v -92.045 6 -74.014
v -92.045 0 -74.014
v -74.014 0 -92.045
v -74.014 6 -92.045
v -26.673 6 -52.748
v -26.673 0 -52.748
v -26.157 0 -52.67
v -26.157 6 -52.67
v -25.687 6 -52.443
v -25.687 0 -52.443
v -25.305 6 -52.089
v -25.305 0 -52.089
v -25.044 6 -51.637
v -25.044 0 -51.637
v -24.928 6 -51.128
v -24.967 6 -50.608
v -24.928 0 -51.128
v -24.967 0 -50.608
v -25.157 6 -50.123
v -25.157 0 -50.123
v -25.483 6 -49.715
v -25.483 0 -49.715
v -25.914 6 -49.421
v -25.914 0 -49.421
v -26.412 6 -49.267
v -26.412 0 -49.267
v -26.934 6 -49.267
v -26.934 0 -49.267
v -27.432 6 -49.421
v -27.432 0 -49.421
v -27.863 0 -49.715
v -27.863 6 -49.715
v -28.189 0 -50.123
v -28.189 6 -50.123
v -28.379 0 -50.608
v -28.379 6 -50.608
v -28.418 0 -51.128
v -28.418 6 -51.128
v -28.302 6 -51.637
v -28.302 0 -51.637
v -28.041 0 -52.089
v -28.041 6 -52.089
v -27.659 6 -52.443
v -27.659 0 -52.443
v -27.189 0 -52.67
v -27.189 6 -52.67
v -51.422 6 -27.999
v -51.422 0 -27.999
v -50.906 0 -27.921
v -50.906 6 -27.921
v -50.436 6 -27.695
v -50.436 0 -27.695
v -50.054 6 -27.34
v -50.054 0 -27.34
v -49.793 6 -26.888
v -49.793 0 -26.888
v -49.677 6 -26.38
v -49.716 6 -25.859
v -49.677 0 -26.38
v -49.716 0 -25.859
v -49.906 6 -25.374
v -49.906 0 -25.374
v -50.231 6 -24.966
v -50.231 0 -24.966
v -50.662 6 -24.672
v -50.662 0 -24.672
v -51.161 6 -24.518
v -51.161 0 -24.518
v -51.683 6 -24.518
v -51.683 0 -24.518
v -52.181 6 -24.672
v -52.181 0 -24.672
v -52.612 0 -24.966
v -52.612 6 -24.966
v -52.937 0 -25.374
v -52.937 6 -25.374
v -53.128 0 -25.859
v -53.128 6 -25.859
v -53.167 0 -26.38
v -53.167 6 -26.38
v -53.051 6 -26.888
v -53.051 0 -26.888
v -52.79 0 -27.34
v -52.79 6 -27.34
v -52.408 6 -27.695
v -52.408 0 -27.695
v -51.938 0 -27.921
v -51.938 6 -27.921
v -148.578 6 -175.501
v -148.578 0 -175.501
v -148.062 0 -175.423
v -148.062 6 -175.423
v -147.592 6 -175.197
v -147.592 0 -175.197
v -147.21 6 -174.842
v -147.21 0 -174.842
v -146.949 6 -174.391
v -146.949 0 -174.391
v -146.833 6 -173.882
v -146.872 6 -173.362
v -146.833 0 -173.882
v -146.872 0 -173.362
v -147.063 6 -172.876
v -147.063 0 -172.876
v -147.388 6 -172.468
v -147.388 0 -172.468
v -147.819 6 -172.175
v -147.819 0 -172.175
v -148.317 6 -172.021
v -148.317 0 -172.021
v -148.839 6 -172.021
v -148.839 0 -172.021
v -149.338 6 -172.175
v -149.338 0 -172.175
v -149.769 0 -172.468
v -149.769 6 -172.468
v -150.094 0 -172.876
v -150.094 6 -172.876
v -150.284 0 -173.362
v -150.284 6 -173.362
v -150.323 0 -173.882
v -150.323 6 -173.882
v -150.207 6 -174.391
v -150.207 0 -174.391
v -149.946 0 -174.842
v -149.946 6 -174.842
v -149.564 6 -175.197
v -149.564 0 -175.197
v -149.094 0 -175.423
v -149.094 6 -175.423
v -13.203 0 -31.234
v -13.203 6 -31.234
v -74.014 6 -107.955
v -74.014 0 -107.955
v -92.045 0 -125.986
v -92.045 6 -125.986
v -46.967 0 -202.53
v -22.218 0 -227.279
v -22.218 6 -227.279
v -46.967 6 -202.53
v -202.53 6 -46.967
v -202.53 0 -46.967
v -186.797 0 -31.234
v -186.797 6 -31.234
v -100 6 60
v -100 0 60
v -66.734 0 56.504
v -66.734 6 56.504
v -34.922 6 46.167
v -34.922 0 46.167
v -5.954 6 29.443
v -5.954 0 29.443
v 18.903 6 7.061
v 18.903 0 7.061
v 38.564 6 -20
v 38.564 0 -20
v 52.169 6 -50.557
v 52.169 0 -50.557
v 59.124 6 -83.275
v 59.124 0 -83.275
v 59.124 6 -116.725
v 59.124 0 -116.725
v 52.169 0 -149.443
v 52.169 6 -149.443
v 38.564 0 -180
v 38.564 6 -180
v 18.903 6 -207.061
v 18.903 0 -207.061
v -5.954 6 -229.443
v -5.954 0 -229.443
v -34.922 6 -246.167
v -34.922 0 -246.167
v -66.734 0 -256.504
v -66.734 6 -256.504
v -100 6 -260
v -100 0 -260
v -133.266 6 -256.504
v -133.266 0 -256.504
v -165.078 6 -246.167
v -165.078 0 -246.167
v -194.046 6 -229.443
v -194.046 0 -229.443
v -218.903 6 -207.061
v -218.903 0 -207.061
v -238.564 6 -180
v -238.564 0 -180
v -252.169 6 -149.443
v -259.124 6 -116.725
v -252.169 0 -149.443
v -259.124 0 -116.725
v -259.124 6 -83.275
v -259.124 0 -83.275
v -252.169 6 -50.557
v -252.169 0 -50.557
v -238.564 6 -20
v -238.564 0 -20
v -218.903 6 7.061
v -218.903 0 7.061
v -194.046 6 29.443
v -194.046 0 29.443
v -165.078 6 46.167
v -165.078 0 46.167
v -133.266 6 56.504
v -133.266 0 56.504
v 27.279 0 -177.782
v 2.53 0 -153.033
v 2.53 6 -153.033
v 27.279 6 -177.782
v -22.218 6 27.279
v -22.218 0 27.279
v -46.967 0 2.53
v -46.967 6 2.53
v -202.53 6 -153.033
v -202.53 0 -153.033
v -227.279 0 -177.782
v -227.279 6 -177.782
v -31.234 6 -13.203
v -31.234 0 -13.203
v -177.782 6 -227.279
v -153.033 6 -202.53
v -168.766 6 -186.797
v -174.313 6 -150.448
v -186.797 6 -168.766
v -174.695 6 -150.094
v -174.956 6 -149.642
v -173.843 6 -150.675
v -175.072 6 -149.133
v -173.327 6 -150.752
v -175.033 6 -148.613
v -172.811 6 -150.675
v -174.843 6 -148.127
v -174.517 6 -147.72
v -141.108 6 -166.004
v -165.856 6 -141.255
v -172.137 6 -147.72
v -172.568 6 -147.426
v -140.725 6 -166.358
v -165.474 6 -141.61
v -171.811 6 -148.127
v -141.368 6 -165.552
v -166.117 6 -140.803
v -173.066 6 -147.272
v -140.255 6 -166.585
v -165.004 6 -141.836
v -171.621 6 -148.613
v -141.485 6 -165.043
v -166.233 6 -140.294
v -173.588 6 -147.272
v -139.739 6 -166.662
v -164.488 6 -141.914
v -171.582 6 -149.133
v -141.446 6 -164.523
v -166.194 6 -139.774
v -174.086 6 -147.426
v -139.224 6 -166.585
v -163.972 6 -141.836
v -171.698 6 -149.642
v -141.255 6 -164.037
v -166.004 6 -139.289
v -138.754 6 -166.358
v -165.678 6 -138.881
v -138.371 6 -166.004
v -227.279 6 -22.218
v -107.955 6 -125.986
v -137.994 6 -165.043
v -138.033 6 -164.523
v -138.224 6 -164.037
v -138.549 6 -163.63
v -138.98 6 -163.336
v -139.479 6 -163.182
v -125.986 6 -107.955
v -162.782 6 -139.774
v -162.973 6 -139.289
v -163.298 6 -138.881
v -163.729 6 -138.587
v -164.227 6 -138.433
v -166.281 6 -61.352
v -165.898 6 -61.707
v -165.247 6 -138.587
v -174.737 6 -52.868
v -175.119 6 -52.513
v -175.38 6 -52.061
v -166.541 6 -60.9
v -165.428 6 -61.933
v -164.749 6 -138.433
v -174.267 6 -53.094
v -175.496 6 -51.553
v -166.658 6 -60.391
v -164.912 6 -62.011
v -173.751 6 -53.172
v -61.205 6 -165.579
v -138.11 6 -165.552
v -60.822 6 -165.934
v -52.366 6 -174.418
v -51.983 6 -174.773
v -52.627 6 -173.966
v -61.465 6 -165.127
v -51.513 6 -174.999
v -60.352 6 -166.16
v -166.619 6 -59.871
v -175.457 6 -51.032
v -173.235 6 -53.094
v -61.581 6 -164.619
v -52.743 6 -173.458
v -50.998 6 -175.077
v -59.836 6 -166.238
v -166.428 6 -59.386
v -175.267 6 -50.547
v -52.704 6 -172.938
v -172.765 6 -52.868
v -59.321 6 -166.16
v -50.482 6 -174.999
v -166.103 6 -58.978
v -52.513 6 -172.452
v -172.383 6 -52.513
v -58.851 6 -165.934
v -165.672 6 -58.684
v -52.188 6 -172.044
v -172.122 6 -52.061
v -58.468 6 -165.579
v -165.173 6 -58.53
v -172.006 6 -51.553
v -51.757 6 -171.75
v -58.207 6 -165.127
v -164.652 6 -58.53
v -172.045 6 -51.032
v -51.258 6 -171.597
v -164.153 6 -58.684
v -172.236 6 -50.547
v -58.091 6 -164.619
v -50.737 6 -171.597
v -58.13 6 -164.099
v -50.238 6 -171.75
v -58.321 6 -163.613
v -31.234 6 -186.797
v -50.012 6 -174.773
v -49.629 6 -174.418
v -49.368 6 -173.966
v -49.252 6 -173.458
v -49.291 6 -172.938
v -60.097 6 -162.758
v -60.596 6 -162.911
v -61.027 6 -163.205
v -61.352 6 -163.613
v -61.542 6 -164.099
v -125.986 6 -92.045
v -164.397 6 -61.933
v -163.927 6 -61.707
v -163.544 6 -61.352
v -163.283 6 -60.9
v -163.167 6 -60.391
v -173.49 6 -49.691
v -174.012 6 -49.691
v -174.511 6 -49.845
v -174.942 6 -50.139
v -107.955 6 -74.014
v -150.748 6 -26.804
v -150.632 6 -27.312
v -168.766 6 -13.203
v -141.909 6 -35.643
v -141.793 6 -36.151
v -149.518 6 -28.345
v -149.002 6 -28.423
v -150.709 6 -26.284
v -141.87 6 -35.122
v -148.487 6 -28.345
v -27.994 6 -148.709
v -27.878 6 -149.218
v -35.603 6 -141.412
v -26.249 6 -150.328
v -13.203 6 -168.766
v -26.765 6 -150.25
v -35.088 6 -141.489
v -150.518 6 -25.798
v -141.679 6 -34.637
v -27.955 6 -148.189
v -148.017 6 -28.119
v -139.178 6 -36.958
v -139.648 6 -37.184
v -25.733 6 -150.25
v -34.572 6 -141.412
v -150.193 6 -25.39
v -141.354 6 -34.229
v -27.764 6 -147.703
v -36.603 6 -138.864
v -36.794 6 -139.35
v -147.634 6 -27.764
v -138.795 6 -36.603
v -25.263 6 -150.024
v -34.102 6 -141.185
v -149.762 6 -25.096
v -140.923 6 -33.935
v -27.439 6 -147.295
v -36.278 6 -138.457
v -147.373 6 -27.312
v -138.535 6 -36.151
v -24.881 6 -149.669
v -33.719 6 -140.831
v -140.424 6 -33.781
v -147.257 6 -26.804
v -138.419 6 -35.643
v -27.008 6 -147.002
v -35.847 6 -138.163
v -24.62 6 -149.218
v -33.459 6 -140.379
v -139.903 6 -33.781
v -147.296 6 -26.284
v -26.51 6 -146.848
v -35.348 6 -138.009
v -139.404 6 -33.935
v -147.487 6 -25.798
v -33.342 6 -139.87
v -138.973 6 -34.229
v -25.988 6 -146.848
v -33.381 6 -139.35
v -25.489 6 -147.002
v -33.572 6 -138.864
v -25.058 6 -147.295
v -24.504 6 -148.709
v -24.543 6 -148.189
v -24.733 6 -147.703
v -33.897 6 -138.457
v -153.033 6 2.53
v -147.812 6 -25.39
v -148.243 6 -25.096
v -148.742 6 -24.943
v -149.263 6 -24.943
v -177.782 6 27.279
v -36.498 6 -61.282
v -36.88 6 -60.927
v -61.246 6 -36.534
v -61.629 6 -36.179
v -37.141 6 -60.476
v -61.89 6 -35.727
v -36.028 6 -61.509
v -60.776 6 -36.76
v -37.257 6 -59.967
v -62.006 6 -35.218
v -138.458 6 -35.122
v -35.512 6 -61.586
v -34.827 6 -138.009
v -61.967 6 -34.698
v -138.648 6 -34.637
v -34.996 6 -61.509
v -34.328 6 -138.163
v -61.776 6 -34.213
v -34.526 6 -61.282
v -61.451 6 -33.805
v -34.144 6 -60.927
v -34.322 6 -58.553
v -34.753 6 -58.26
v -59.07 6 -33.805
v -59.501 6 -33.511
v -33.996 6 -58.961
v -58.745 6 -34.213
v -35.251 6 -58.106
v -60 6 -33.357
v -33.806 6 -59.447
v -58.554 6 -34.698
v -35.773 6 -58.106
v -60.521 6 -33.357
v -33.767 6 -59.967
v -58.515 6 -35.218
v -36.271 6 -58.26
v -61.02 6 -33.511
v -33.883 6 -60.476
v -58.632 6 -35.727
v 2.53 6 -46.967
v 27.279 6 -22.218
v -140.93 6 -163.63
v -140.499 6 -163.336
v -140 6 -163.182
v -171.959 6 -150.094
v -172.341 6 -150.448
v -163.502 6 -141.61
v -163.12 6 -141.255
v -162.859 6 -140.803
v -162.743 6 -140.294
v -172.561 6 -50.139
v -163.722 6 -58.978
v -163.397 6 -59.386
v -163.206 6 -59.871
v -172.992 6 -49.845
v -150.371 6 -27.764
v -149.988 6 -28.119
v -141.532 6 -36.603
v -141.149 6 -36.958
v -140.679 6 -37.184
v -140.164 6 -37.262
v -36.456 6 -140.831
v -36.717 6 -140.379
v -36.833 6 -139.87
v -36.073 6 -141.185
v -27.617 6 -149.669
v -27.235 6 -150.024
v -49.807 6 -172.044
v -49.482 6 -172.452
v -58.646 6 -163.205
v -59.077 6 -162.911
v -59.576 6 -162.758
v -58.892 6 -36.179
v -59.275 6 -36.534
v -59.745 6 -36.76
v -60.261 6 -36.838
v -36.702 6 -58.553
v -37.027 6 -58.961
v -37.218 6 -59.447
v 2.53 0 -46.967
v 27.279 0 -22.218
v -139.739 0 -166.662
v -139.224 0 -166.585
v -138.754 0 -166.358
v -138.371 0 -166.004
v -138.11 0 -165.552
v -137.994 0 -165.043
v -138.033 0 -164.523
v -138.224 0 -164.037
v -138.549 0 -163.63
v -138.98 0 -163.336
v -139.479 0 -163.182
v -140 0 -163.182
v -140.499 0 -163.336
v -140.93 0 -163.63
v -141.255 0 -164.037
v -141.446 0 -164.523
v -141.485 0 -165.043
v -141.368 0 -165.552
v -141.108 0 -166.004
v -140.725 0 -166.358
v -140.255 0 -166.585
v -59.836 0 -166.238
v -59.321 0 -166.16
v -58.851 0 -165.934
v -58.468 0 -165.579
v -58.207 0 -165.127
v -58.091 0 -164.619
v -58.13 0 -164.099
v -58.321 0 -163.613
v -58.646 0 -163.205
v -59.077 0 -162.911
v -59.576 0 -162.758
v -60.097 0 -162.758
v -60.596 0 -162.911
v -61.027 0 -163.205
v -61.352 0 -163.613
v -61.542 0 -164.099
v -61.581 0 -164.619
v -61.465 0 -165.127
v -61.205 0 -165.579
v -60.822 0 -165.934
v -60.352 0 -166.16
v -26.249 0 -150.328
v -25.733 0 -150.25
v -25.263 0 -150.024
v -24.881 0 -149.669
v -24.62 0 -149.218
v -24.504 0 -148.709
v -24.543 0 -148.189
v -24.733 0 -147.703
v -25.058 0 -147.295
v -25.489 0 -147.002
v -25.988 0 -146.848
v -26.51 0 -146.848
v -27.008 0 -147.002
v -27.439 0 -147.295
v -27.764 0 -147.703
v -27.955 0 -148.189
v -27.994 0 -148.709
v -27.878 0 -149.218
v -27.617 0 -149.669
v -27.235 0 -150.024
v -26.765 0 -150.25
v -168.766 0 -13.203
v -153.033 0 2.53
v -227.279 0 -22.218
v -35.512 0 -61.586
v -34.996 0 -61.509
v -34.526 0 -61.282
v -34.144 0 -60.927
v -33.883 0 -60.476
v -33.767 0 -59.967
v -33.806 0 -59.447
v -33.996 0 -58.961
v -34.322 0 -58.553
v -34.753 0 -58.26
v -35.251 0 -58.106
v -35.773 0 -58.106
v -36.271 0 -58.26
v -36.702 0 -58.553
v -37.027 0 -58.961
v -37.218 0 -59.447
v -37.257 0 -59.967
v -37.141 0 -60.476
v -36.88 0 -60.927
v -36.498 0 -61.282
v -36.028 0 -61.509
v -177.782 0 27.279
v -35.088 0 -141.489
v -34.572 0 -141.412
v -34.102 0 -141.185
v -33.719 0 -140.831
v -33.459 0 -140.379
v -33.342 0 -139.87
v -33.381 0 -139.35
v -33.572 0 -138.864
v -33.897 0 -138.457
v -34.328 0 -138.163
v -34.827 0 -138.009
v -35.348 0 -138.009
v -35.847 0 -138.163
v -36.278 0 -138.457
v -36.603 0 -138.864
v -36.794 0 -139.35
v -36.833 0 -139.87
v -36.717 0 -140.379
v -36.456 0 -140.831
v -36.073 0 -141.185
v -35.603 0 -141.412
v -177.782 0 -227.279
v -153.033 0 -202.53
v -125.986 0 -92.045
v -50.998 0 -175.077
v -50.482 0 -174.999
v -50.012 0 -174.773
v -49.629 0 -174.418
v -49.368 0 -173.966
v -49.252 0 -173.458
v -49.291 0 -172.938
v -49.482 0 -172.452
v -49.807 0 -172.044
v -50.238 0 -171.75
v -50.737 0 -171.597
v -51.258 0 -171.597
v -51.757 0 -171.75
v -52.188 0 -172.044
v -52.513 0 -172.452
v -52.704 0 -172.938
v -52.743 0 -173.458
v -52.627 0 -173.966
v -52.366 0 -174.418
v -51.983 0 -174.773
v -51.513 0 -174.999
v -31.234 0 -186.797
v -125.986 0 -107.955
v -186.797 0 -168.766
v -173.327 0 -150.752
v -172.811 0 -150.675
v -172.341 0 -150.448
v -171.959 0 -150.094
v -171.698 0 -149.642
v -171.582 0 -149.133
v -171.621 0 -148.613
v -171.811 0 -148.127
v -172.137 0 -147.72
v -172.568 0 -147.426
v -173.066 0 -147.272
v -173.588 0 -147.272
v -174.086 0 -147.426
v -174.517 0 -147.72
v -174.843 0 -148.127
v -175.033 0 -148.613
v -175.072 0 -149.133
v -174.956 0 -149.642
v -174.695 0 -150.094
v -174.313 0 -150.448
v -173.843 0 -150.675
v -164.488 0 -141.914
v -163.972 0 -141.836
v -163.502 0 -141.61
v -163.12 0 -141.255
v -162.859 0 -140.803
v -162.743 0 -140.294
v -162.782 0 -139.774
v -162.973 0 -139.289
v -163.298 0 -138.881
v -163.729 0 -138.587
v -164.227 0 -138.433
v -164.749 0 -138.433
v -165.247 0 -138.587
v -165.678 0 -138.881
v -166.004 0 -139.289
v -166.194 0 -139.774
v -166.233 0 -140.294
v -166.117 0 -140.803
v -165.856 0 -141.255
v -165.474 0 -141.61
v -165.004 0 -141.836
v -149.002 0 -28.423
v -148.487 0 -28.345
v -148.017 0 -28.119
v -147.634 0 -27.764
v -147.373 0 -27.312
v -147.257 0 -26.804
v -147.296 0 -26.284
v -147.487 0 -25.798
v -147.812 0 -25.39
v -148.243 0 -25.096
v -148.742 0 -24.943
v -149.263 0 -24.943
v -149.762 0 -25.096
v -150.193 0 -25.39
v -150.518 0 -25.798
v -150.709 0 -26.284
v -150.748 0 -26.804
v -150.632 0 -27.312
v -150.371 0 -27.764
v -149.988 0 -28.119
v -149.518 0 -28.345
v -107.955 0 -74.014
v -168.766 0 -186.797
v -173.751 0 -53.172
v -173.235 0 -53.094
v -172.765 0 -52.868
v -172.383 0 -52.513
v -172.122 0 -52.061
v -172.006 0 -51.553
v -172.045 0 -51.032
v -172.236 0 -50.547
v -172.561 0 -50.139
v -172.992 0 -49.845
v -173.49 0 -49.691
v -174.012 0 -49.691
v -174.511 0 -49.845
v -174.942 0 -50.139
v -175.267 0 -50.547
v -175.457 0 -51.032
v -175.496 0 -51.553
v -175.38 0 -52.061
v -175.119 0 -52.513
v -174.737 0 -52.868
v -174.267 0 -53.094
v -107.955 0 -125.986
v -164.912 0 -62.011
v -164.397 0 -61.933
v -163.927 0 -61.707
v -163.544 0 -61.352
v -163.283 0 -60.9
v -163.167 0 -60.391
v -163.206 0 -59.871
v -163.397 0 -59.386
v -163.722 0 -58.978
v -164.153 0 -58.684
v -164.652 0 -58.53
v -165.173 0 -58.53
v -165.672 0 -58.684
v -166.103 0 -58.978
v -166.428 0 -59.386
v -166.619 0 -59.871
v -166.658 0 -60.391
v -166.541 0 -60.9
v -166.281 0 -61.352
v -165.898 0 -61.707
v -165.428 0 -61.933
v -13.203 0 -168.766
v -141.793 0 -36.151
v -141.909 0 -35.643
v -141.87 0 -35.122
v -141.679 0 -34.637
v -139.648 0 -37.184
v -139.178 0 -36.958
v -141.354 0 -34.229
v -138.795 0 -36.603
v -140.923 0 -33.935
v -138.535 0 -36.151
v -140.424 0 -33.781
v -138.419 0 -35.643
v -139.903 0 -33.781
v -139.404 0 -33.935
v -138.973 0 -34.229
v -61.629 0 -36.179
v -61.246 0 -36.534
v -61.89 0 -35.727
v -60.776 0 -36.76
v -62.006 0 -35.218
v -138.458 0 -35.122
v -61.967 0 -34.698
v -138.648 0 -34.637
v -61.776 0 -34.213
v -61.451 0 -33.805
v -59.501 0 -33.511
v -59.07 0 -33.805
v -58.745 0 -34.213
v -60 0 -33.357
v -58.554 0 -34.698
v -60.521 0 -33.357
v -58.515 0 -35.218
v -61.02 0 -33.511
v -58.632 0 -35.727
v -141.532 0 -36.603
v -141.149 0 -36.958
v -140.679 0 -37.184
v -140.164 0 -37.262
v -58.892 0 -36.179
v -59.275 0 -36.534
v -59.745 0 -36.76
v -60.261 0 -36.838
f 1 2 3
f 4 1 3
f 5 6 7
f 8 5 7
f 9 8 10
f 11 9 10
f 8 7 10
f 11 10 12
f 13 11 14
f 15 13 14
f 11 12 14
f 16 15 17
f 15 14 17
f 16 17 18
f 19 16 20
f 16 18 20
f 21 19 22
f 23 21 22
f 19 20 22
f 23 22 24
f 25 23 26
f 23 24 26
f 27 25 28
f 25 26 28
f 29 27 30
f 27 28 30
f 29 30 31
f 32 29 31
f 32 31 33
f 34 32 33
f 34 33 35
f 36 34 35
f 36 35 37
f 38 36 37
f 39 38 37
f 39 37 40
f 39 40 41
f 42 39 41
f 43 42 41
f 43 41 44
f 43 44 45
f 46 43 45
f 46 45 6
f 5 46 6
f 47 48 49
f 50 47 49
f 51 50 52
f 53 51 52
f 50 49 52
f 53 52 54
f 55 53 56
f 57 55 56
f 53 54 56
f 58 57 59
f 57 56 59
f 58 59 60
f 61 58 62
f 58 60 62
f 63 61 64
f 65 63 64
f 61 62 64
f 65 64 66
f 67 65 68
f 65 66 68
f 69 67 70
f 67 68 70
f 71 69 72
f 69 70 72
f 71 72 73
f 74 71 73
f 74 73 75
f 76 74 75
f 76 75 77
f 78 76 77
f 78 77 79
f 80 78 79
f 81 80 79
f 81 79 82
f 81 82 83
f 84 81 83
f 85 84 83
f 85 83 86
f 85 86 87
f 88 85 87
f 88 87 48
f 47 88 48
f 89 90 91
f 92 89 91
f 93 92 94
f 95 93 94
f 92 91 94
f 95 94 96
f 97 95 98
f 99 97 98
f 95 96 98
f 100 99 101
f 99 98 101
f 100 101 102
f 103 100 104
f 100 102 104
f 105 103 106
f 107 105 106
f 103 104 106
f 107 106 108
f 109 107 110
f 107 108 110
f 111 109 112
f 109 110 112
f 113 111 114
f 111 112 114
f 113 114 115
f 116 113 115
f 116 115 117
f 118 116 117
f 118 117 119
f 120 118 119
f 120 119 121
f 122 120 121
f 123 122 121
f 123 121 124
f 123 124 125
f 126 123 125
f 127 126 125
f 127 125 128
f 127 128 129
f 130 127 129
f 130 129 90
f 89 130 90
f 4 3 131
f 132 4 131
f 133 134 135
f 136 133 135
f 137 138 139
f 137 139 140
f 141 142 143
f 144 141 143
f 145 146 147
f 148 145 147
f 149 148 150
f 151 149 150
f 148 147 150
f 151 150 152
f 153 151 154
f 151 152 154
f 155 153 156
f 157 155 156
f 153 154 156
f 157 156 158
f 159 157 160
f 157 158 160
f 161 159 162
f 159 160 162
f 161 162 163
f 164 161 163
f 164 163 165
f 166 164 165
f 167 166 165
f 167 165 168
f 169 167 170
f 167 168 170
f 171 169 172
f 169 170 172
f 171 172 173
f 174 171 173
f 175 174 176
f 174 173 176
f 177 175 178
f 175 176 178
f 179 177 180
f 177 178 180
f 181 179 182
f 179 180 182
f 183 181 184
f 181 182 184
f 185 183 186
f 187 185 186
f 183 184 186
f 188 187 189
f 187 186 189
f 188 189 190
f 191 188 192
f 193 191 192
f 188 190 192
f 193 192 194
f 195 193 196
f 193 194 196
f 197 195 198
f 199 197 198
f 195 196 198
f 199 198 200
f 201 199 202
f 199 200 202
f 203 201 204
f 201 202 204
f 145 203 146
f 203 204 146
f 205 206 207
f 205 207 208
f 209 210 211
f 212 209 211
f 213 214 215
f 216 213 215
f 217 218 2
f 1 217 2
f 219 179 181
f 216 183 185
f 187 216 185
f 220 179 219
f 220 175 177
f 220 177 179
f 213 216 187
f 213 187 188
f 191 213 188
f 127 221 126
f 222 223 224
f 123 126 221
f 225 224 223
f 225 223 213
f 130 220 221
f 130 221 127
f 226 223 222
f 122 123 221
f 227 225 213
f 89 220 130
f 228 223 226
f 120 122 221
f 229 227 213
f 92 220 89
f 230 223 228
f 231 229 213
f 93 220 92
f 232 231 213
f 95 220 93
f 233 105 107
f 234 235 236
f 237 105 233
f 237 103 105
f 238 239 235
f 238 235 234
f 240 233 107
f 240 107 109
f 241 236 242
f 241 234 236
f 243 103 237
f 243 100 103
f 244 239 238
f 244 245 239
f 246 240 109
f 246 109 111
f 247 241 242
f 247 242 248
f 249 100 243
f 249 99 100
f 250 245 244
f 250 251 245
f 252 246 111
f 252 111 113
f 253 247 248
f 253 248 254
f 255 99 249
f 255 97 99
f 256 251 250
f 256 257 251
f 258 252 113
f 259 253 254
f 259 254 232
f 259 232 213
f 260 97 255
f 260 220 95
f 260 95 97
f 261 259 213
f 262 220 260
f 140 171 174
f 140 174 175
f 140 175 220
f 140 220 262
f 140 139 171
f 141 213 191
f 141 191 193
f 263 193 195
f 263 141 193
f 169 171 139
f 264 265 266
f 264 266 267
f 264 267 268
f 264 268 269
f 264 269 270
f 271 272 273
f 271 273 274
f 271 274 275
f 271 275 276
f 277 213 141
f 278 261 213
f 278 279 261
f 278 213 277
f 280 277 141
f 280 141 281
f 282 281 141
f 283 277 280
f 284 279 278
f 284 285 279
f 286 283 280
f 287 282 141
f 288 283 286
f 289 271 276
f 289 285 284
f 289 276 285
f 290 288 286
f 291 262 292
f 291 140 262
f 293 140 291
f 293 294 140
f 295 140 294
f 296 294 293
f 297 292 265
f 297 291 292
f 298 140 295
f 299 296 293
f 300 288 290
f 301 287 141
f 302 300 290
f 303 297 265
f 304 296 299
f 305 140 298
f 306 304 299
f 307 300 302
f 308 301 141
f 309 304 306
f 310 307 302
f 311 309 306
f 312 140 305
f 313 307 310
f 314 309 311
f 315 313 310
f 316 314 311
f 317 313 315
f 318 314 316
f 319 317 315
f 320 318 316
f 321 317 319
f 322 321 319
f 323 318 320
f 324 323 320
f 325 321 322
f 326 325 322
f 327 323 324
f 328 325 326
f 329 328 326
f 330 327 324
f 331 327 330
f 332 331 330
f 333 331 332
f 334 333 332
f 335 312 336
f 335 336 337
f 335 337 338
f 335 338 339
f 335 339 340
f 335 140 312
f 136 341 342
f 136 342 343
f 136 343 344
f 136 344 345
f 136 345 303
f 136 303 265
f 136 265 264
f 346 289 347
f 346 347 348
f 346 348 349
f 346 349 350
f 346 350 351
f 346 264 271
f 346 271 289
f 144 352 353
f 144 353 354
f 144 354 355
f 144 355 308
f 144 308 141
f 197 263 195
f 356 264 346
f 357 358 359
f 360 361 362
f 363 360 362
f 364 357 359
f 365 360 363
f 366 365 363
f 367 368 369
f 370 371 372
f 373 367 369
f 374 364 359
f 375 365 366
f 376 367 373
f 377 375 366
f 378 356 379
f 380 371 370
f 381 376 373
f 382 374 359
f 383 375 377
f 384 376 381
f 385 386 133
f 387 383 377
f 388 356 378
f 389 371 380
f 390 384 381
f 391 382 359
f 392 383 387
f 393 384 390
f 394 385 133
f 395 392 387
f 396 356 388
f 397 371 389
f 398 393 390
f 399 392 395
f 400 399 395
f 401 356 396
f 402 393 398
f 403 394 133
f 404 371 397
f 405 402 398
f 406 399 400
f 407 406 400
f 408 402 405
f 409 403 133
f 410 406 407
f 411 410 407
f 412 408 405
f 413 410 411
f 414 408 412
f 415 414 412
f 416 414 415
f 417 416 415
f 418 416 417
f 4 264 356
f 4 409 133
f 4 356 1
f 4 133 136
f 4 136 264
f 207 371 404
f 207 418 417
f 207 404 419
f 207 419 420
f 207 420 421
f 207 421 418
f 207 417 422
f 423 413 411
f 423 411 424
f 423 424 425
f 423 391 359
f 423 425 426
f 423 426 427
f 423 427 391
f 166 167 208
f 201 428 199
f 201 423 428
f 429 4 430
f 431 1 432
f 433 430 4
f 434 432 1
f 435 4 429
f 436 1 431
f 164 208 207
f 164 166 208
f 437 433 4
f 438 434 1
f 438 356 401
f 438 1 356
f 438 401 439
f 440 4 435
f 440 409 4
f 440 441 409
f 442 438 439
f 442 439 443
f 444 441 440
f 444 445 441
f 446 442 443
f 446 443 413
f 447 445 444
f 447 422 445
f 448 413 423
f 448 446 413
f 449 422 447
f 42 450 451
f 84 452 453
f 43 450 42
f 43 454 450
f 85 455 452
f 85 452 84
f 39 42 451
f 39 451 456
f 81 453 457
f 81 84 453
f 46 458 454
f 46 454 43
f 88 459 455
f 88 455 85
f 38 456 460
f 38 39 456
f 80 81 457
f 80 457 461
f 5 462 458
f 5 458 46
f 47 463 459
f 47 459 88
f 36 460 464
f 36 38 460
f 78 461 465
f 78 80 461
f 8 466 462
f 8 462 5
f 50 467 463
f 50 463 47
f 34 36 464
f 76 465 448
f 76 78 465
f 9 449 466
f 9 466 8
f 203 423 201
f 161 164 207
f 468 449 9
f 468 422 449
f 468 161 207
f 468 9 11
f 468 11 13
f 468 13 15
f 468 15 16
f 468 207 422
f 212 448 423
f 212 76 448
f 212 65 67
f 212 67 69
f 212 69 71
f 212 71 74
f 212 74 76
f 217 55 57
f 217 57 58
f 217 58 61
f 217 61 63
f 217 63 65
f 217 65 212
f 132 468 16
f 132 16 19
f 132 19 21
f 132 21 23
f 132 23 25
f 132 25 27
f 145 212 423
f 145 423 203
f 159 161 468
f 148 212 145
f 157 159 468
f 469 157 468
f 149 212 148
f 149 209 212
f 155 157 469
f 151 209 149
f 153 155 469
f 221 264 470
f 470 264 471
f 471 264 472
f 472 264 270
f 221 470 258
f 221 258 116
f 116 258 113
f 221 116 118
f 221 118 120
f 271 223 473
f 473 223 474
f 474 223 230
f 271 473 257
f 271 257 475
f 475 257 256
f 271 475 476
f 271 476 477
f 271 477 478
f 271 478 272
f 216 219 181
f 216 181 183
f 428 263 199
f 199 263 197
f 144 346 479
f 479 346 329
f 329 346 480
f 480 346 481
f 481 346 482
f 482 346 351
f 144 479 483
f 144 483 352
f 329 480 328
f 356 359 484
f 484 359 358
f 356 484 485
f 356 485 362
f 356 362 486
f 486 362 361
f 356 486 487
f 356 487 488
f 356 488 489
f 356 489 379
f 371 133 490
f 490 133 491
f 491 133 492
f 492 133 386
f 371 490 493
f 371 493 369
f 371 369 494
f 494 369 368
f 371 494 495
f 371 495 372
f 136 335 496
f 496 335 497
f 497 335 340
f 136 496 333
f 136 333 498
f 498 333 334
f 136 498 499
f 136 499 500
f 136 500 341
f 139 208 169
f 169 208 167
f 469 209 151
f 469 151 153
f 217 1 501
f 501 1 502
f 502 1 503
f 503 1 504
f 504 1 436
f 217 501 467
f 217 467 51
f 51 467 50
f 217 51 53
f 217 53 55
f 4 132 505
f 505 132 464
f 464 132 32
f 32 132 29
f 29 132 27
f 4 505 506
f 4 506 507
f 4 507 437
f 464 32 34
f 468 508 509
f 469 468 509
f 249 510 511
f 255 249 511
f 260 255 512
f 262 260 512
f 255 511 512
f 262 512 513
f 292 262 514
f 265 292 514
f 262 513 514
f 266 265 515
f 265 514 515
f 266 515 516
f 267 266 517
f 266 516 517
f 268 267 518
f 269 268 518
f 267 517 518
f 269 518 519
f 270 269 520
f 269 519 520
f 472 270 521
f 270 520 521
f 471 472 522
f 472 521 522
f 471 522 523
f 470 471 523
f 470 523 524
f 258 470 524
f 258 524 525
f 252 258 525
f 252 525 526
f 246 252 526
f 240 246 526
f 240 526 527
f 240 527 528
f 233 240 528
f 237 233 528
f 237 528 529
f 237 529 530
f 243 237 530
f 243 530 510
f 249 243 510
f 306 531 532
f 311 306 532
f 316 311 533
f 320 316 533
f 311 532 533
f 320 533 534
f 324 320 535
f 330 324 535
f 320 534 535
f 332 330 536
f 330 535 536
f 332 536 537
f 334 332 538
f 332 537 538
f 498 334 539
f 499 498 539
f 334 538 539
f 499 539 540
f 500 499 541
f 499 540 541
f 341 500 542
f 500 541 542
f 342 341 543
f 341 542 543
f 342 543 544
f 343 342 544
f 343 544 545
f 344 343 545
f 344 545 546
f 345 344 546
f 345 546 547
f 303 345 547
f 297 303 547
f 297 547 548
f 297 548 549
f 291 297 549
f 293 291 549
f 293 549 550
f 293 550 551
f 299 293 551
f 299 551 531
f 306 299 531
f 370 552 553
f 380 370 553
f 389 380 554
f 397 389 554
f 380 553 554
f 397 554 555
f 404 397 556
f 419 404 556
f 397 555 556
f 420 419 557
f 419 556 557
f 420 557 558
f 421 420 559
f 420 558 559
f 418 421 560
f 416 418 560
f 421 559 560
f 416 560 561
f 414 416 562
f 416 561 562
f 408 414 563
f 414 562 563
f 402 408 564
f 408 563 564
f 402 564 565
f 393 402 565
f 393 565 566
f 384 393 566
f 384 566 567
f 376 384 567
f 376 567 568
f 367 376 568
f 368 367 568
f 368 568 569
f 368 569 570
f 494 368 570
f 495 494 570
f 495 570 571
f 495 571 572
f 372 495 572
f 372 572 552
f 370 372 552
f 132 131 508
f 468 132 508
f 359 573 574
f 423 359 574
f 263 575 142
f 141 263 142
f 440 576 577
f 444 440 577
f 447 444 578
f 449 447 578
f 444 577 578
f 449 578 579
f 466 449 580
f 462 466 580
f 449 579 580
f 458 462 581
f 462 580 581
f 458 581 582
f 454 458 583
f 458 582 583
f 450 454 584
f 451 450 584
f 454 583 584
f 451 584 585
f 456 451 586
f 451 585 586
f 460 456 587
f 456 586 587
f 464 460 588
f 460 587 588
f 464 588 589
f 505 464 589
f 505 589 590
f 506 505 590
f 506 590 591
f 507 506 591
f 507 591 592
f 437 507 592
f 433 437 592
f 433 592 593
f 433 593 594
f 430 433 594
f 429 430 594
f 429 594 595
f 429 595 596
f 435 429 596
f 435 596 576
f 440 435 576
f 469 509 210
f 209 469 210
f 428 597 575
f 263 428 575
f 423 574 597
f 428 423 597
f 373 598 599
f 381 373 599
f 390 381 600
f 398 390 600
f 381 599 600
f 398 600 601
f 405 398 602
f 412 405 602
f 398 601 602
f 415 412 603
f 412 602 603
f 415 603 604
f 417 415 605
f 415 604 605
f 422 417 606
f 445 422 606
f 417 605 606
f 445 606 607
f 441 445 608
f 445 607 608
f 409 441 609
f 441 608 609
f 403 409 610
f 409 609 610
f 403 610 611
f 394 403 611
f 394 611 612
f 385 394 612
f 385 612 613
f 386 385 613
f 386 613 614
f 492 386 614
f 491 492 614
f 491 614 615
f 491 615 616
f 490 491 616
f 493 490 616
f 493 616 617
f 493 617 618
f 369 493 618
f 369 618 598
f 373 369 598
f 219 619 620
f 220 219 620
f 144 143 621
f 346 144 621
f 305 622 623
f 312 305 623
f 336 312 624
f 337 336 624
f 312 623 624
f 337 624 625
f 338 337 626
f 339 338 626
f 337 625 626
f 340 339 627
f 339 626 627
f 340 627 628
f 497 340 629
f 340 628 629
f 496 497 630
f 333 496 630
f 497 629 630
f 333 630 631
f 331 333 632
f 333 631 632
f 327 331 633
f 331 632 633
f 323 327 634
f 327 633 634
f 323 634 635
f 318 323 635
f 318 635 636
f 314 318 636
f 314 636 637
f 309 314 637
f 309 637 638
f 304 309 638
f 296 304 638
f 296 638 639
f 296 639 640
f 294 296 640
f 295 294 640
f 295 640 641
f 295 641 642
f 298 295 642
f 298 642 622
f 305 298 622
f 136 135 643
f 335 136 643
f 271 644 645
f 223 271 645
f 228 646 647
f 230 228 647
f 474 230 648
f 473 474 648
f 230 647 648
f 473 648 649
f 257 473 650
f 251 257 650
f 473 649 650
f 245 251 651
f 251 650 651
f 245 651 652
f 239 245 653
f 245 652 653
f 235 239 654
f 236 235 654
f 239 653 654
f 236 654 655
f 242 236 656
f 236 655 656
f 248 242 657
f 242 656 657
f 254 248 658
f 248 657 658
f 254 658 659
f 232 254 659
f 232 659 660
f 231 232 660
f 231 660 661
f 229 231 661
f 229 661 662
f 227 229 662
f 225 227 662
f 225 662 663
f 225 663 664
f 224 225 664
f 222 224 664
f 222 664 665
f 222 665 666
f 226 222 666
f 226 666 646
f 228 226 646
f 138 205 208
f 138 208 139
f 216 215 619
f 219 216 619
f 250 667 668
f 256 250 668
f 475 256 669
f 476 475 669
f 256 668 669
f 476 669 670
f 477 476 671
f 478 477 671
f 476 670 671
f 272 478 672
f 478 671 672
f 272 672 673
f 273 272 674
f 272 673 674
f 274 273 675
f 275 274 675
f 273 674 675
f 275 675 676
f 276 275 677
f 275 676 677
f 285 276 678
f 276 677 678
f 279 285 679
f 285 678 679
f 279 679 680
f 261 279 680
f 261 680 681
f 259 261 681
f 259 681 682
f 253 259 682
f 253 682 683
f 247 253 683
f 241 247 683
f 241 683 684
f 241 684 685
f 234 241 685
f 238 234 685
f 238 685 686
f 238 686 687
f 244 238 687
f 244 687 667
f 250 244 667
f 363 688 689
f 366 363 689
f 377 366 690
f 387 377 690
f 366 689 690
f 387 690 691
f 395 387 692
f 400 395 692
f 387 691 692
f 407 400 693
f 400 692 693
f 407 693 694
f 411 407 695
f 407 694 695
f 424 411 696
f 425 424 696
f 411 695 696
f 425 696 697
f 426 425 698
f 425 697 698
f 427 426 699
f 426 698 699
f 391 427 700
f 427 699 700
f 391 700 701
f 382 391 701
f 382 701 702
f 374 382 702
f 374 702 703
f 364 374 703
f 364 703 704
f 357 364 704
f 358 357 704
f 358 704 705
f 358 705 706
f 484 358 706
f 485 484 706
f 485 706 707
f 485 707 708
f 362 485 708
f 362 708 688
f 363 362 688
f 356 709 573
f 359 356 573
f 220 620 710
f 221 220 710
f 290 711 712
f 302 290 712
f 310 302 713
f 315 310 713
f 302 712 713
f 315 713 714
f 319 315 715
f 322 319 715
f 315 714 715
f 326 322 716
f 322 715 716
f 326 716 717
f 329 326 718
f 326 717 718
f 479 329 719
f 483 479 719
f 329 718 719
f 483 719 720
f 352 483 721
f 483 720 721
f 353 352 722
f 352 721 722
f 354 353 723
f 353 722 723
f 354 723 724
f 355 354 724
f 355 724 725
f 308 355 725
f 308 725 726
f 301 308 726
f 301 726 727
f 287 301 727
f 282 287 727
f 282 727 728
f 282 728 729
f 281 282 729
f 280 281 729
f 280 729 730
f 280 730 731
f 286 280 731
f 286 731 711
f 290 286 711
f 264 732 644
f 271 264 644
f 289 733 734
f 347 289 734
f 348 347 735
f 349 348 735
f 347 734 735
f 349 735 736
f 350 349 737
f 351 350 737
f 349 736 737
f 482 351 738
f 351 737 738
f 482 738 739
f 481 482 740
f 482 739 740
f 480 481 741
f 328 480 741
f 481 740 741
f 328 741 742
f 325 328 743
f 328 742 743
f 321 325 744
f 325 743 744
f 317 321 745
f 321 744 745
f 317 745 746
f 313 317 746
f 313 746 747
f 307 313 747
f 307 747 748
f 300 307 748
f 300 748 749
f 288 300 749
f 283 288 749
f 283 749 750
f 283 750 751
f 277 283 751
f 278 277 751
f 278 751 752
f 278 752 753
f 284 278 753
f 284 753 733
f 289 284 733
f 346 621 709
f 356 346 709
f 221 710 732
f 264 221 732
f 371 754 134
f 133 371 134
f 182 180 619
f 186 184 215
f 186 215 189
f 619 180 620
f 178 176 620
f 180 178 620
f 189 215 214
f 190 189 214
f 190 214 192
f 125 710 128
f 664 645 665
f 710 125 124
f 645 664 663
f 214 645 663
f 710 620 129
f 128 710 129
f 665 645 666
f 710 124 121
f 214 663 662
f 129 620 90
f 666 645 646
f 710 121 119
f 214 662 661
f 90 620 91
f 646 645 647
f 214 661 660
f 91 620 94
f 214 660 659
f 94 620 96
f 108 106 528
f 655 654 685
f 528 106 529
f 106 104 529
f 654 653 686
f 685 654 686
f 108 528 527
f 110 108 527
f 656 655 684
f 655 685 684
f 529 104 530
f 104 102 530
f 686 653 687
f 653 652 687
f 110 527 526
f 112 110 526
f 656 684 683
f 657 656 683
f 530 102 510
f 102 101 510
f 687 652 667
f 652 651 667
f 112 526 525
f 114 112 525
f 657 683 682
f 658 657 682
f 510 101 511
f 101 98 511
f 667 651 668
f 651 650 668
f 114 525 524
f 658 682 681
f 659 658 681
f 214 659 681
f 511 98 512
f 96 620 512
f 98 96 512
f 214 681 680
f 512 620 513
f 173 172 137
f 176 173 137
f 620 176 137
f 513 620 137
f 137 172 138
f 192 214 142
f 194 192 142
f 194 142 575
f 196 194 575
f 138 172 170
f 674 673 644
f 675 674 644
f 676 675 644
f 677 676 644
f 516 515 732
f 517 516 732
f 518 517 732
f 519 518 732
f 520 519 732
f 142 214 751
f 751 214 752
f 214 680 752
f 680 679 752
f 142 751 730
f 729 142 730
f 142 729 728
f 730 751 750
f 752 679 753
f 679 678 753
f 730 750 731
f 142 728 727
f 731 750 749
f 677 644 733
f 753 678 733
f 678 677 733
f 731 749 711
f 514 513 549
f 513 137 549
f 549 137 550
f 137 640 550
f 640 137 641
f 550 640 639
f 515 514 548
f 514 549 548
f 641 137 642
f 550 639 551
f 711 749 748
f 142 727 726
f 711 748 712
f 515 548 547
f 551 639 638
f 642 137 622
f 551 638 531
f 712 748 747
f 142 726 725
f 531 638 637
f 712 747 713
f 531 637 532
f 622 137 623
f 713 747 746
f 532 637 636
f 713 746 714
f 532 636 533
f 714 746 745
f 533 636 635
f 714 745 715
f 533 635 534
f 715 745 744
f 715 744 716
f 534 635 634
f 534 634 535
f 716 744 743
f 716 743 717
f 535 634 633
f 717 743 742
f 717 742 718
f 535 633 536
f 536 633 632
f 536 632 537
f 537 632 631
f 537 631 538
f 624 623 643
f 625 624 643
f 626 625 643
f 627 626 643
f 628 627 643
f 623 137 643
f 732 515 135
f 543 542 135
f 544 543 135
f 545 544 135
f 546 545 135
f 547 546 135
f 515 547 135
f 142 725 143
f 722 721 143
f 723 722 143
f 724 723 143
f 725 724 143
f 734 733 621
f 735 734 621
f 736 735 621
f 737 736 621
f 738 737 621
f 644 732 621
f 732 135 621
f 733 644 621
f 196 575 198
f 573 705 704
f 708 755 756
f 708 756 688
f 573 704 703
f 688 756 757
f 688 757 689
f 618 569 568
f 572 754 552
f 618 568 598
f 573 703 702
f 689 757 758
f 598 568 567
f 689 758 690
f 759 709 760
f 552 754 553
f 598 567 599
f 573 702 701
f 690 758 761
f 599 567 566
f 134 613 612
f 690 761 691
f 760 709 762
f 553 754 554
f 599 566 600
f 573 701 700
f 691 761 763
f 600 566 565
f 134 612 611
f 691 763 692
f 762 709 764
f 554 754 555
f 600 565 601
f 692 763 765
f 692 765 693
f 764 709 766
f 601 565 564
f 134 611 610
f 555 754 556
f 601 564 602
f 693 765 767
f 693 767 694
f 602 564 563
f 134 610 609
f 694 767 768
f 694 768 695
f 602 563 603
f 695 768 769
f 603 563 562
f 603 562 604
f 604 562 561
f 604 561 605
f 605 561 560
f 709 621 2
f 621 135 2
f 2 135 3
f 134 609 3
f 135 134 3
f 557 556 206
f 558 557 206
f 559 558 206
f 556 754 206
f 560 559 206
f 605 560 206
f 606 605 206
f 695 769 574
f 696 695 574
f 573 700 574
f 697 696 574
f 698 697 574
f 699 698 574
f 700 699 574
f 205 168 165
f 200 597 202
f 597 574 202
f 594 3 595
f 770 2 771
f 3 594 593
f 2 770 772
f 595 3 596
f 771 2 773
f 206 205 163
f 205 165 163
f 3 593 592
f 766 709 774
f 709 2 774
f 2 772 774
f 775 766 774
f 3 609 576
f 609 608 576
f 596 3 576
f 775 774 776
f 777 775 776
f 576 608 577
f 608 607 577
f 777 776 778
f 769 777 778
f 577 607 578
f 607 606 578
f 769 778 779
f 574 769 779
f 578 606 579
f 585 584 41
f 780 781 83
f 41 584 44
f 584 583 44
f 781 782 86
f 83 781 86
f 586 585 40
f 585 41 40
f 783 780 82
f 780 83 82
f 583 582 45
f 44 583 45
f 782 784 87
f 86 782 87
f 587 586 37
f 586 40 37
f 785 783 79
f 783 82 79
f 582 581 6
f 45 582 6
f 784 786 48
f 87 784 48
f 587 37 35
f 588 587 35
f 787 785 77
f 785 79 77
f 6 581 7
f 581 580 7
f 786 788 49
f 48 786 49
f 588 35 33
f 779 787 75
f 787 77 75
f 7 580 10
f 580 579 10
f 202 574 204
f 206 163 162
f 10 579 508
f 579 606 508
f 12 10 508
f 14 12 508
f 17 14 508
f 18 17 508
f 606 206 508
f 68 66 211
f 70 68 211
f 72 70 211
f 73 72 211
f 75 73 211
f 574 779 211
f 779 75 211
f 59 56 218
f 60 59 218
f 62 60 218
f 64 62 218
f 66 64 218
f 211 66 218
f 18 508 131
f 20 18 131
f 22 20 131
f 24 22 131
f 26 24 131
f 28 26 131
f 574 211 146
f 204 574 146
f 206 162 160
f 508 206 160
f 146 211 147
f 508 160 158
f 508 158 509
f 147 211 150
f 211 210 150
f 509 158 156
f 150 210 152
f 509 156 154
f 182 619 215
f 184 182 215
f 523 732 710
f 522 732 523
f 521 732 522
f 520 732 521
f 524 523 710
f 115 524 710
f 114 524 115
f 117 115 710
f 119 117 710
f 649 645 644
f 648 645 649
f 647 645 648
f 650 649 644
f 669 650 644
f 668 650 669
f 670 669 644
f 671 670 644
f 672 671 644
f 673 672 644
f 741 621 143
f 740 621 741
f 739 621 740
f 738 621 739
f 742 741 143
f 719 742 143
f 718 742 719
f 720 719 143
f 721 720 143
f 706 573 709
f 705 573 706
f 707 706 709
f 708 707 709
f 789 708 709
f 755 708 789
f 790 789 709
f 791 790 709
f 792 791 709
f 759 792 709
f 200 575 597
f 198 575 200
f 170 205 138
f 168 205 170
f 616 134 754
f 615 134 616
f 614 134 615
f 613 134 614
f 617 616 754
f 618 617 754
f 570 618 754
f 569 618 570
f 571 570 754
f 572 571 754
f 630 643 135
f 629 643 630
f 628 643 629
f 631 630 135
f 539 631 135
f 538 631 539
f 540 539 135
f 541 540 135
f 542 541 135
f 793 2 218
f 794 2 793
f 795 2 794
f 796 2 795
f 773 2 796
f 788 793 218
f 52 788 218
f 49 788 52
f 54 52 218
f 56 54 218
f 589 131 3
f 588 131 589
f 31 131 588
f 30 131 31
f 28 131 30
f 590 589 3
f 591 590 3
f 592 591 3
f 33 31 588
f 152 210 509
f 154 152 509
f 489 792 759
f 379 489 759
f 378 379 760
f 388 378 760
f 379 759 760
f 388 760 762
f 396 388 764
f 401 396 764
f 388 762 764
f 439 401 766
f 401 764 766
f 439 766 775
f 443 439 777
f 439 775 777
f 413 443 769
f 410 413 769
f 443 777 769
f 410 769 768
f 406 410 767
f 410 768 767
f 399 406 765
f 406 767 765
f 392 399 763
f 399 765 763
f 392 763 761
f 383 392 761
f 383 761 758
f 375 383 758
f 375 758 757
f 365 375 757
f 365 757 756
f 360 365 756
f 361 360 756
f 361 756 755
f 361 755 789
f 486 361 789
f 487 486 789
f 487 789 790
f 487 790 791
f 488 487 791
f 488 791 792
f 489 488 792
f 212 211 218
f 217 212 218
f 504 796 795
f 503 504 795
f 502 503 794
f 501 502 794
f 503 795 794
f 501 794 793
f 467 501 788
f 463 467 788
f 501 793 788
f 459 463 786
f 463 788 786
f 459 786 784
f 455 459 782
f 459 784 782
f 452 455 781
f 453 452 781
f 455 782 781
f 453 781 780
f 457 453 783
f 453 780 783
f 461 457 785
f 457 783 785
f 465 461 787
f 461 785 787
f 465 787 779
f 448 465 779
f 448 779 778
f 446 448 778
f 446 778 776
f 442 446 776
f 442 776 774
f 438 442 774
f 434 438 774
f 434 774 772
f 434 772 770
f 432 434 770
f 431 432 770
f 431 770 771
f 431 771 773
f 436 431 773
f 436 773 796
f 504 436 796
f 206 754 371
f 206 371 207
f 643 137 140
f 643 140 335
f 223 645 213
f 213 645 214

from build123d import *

# Parameters (mm, degrees)
SKETCH1_R           = 160
BOSS_EXTRUDE1_DEPTH = 6
CUT_EXTRUDE1_DEPTH  = 368.744476505
CUT_EXTRUDE2_DEPTH  = 368.744476505
SKETCH7_R           = 1.75
CUT_EXTRUDE3_DEPTH  = 368.744476505


with BuildPart() as part:
    # Sketch1 → Boss-Extrude1 (new body)
    with BuildSketch(Plane(origin=(0, 0, 0), x_dir=(1, 0, 0), z_dir=(0, 1, 0))):
        with Locations(Location((-100, 100, 0), (0, 0, 270))):
            Circle(SKETCH1_R)
    extrude(amount=BOSS_EXTRUDE1_DEPTH)

    # Sketch3 → Cut-Extrude1 (cut, through all)
    with BuildSketch(Plane.XZ):
        Polygon((-22.218254069, -227.279220614), (-46.966991411, -202.530483272), (2.530483272, -153.033008589), (27.279220614, -177.781745931), align=None)
        Polygon((2.530483272, -46.966991411), (27.279220614, -22.218254069), (-22.218254069, 27.279220614), (-46.966991411, 2.530483272), align=None)
        Polygon((-153.033008589, 2.530483272), (-177.781745931, 27.279220614), (-227.279220614, -22.218254069), (-202.530483272, -46.966991411), align=None)
        Polygon((-177.781745931, -227.279220614), (-153.033008589, -202.530483272), (-202.530483272, -153.033008589), (-227.279220614, -177.781745931), align=None)
    extrude(amount=-CUT_EXTRUDE1_DEPTH, mode=Mode.SUBTRACT)

    # Sketch4 → Cut-Extrude2 (cut, through all)
    with BuildSketch(Plane.XZ):
        Polygon((-31.23386553, -186.797357391), (-13.202642609, -168.76613447), (-74.013825791, -107.954951288), (-92.045048712, -125.986174209), align=None)
        Polygon((-125.986174209, -107.954951288), (-186.797357391, -168.76613447), (-168.76613447, -186.797357391), (-107.954951288, -125.986174209), align=None)
        Polygon((-107.954951288, -74.013825791), (-168.76613447, -13.202642609), (-186.797357391, -31.23386553), (-125.986174209, -92.045048712), align=None)
        Polygon((-74.013825791, -92.045048712), (-13.202642609, -31.23386553), (-31.23386553, -13.202642609), (-92.045048712, -74.013825791), align=None)
    extrude(amount=-CUT_EXTRUDE2_DEPTH, mode=Mode.SUBTRACT)

    # Sketch7 → Cut-Extrude3 (cut, through all)
    with BuildSketch(Plane.XZ):
        with Locations(Location((-149.002499936, -26.673026791, 0), (0, 0, 270))):
            Circle(SKETCH7_R)
        with Locations(Location((-148.578235868, -173.751237278, 0), (0, 0, 270))):
            Circle(SKETCH7_R)
        with Locations(Location((-140.163665171, -35.511861556, 0), (0, 0, 270))):
            Circle(SKETCH7_R)
        with Locations(Location((-164.912402513, -60.260598897, 0), (0, 0, 270))):
            Circle(SKETCH7_R)
        with Locations(Location((-173.751237278, -51.421764132, 0), (0, 0, 270))):
            Circle(SKETCH7_R)
        with Locations(Location((-173.326973209, -149.002499936, 0), (0, 0, 270))):
            Circle(SKETCH7_R)
        with Locations(Location((-164.488138444, -140.163665171, 0), (0, 0, 270))):
            Circle(SKETCH7_R)
        with Locations(Location((-139.739401103, -164.912402513, 0), (0, 0, 270))):
            Circle(SKETCH7_R)
        with Locations(Location((-26.673026791, -50.997500064, 0), (0, 0, 270))):
            Circle(SKETCH7_R)
        with Locations(Location((-35.511861556, -59.836334829, 0), (0, 0, 270))):
            Circle(SKETCH7_R)
        with Locations(Location((-60.260598897, -35.087597487, 0), (0, 0, 270))):
            Circle(SKETCH7_R)
        with Locations(Location((-51.421764132, -26.248762722, 0), (0, 0, 270))):
            Circle(SKETCH7_R)
        with Locations(Location((-50.997500064, -173.326973209, 0), (0, 0, 270))):
            Circle(SKETCH7_R)
        with Locations(Location((-59.836334829, -164.488138444, 0), (0, 0, 270))):
            Circle(SKETCH7_R)
        with Locations(Location((-35.087597487, -139.739401103, 0), (0, 0, 270))):
            Circle(SKETCH7_R)
        with Locations(Location((-26.248762722, -148.578235868, 0), (0, 0, 270))):
            Circle(SKETCH7_R)
    extrude(amount=-CUT_EXTRUDE3_DEPTH, mode=Mode.SUBTRACT)


solid = part.part
